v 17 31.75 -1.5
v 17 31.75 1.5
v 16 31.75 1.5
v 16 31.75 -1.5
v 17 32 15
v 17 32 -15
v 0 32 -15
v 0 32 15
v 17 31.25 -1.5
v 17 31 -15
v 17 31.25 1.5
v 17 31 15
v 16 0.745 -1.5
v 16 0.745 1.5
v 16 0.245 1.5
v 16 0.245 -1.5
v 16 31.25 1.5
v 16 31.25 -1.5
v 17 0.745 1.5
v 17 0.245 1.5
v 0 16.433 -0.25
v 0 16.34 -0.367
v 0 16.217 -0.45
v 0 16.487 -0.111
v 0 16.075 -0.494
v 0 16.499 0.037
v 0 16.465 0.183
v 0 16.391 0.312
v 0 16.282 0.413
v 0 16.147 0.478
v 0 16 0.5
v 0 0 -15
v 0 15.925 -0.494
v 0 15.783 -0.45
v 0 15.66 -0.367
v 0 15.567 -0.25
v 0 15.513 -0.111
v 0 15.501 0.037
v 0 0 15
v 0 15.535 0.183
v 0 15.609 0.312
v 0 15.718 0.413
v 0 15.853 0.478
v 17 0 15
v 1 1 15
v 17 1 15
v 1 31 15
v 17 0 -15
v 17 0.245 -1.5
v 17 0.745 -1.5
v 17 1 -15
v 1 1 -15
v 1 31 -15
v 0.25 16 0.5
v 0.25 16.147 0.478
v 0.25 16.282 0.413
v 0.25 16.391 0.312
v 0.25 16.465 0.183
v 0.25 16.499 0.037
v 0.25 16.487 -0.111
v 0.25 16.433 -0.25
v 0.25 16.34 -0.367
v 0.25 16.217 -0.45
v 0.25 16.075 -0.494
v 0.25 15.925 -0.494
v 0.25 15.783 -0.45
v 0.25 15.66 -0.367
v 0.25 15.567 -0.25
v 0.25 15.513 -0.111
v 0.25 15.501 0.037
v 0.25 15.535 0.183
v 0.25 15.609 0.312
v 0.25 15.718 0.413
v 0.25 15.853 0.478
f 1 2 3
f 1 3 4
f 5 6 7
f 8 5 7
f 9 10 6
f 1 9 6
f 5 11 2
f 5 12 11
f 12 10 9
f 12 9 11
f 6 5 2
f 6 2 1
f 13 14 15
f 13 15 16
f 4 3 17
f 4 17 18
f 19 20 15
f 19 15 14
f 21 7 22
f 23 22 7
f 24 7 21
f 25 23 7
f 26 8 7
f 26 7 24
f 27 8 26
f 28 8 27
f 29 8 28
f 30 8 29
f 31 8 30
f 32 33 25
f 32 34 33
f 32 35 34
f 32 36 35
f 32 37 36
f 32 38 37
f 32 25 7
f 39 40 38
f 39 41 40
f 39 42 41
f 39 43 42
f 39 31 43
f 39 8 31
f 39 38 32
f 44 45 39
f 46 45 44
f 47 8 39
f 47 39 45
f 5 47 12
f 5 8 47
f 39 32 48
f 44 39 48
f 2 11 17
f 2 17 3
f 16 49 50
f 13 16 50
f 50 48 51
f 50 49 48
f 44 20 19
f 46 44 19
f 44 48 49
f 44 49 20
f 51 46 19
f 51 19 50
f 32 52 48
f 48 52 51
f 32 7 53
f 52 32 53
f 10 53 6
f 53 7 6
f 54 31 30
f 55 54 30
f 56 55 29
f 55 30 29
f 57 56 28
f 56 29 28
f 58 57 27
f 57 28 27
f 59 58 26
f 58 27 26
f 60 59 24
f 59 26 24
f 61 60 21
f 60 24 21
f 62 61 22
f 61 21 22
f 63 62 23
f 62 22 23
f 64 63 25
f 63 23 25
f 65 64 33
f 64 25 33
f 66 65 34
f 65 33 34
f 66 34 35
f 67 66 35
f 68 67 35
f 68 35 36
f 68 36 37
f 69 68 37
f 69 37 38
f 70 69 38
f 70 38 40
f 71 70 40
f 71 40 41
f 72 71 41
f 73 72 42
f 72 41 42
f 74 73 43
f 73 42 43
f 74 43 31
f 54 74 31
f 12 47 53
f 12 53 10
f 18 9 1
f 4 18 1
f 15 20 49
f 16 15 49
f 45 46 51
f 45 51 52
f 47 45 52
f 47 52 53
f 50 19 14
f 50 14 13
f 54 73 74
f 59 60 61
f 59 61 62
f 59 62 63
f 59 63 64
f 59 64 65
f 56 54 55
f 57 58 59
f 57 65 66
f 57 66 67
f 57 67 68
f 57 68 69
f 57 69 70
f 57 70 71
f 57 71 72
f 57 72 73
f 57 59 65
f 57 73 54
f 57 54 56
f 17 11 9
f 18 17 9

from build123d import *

# Parameters (mm, degrees)
BOSS_EXTRUDE1_DEPTH = 15
SKETCH3_W           = 3
SKETCH3_H           = 0.5
CUT_EXTRUDE1_DEPTH  = 1
SKETCH2_W           = 3
SKETCH2_H           = 0.5
CUT_EXTRUDE2_DEPTH  = 1
SKETCH5_R           = 0.5
CUT_EXTRUDE3_DEPTH  = 0.25


with BuildPart() as part:
    # Sketch1 → Boss-Extrude1 (new body, symmetric)
    with BuildSketch(Plane.XY):
        Polygon((0, 0), (17, 0), (17, 1), (1, 1), (1, 31), (17, 31), (17, 32), (0, 32), align=None)
    extrude(amount=BOSS_EXTRUDE1_DEPTH, both=True)

    # Sketch3 → Cut-Extrude1 (cut)
    with BuildSketch(Plane(origin=(17, 0, 0), x_dir=(0, 0, -1), z_dir=(1, 0, 0))):
        with Locations((0, 0.495)):
            Rectangle(SKETCH3_W, SKETCH3_H)
    extrude(amount=-CUT_EXTRUDE1_DEPTH, mode=Mode.SUBTRACT)

    # Sketch2 → Cut-Extrude2 (cut)
    with BuildSketch(Plane(origin=(17, 0, 0), x_dir=(0, 0, -1), z_dir=(1, 0, 0))):
        with Locations((0, 31.5)):
            Rectangle(SKETCH2_W, SKETCH2_H)
    extrude(amount=-CUT_EXTRUDE2_DEPTH, mode=Mode.SUBTRACT)

    # Sketch5 → Cut-Extrude3 (cut, symmetric)
    with BuildSketch(Plane.ZY):
        with Locations((0, 16)):
            Circle(SKETCH5_R)
    extrude(amount=CUT_EXTRUDE3_DEPTH, both=True, mode=Mode.SUBTRACT)


solid = part.part
